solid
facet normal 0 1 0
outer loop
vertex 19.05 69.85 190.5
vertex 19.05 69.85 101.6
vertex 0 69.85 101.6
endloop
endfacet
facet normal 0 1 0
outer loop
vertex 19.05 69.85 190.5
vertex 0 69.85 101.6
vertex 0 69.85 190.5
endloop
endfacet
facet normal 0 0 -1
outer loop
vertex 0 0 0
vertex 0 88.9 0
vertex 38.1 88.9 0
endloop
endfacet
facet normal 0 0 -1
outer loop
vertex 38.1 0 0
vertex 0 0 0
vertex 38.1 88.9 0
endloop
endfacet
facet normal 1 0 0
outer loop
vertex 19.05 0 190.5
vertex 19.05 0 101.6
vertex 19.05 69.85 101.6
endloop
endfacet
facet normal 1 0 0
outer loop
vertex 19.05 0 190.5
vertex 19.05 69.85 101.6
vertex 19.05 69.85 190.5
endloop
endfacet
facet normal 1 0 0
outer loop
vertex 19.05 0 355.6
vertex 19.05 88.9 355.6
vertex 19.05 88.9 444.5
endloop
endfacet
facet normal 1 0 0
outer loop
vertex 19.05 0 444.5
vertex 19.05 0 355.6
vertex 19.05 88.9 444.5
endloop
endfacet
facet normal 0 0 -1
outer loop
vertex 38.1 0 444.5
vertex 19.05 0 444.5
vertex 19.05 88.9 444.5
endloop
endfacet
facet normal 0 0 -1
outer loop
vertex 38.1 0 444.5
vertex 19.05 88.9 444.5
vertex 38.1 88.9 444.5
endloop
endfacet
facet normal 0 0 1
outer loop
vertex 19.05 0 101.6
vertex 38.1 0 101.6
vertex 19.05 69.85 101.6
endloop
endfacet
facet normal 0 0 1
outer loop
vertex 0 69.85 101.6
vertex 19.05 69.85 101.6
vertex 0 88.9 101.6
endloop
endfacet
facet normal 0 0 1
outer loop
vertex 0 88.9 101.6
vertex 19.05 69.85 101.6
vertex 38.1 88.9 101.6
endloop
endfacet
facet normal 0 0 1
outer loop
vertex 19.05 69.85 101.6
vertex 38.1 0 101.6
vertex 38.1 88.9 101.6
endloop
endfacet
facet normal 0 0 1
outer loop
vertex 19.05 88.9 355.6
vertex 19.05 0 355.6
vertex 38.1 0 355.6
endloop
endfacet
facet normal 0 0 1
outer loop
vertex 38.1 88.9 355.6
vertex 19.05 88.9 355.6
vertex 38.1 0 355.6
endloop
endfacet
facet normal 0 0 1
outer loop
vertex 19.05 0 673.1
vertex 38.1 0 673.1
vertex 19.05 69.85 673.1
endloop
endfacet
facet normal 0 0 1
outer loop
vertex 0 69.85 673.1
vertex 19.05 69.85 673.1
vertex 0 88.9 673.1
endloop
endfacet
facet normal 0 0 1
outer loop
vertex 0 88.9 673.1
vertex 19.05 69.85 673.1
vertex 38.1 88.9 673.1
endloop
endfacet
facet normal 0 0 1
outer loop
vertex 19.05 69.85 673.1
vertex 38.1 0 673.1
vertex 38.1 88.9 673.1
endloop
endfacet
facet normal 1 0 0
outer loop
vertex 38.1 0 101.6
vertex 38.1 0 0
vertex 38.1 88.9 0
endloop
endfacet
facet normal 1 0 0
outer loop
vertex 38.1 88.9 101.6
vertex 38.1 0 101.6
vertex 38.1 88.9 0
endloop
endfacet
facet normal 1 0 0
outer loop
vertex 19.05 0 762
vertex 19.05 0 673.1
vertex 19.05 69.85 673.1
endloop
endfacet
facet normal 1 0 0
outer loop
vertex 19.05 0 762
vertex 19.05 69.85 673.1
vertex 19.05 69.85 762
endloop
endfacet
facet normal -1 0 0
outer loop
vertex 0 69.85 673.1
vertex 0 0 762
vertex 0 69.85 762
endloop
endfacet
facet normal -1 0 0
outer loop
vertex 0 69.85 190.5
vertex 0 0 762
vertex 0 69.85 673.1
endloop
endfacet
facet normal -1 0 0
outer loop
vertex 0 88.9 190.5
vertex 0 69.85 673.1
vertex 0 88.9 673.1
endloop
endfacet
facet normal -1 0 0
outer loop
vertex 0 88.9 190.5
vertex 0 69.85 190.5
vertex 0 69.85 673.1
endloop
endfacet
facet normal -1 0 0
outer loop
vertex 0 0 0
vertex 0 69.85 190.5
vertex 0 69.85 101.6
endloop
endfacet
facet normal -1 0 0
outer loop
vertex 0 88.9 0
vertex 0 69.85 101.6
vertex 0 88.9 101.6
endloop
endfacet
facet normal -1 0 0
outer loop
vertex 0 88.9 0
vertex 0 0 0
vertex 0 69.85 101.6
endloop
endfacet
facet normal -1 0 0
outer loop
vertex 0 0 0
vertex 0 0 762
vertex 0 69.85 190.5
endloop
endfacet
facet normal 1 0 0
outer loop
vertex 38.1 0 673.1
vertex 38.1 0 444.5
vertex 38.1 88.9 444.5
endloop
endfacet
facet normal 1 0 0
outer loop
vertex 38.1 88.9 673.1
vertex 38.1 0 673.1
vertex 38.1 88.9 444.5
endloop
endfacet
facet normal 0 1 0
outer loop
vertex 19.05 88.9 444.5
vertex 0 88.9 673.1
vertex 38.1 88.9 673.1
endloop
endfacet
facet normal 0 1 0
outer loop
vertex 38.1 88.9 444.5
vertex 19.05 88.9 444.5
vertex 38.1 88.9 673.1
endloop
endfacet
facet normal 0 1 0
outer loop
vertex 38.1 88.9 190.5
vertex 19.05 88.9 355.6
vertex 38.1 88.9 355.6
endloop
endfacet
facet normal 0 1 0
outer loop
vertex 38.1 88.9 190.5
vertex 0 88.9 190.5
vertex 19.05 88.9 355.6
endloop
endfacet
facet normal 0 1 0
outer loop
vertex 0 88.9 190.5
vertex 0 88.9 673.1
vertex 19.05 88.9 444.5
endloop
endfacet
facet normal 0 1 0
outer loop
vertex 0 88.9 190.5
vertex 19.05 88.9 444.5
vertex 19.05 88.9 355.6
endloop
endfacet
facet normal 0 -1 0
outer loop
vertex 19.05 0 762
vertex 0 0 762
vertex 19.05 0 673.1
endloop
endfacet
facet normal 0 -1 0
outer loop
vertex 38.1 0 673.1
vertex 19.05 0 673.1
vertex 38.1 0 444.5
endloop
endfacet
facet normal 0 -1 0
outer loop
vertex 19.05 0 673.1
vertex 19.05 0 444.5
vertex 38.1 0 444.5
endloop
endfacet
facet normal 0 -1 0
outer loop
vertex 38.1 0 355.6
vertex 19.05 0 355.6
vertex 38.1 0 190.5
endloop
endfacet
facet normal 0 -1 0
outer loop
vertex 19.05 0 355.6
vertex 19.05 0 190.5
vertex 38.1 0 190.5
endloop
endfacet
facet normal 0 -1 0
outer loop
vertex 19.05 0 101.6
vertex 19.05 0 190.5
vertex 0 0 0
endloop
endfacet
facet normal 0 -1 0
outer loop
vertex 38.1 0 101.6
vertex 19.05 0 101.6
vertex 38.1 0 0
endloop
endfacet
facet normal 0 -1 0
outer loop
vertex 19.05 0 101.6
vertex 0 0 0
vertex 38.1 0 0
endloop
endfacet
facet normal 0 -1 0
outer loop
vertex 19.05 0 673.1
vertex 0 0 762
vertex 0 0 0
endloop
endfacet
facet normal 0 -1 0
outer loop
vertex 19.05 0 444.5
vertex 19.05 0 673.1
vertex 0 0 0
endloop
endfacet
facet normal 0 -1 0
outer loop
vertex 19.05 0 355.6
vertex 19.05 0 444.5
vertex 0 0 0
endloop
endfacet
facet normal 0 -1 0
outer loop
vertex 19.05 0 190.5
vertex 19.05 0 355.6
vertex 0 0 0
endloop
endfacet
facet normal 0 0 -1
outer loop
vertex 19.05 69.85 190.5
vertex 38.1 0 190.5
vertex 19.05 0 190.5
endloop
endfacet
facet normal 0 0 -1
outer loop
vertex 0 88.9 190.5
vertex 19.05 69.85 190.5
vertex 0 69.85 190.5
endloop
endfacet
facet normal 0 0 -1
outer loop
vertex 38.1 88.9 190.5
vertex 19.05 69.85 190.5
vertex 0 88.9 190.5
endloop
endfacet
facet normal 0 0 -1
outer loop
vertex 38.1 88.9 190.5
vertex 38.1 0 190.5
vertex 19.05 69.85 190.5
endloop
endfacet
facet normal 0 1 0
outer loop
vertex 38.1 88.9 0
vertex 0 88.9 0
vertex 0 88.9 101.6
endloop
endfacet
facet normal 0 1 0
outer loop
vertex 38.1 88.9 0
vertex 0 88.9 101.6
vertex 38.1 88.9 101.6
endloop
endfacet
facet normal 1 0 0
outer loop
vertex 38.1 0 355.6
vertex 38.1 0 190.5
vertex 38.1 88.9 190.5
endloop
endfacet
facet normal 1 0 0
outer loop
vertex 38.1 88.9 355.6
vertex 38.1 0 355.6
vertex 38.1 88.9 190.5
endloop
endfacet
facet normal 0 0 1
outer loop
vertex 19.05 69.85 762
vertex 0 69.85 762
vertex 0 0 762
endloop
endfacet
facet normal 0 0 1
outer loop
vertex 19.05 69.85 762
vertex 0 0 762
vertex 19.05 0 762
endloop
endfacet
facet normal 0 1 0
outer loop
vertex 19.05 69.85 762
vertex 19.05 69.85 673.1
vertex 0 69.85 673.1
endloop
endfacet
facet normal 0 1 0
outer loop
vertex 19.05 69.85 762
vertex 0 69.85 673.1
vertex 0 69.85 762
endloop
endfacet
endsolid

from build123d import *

# Parameters (mm, degrees)
F0_W      = 38.1
F0_H      = 88.9
F1_DEPTH  = 762
F2_W      = 19.05
F2_H      = 88.9
F3_DEPTH  = 88.901
F4_W      = 19.05
F4_H      = 88.9
F5_DEPTH  = 88.901
F6_W      = 19.05
F6_H      = 88.9
F7_DEPTH  = 88.901
F8_W      = 19.05
F8_H      = 88.9
F9_DEPTH  = 19.051
F10_W     = 19.05
F10_H     = 88.9
F11_DEPTH = 19.051


with BuildPart() as f1:
    # F0 (on Top) → F1 (new body)
    with BuildSketch(Plane.XY):
        with Locations((19.05, 44.45)):
            Rectangle(F0_W, F0_H)
    extrude(amount=F1_DEPTH)

    # F2 (on face) → F3 (cut, through all)
    with BuildSketch(Plane.XZ):
        with Locations((28.575, 717.55)):
            Rectangle(F2_W, F2_H)
    extrude(amount=-F3_DEPTH, mode=Mode.SUBTRACT)

    # F4 (on face) → F5 (cut, through all)
    with BuildSketch(Plane.XZ):
        with Locations((28.575, 146.05)):
            Rectangle(F4_W, F4_H)
    extrude(amount=-F5_DEPTH, mode=Mode.SUBTRACT)

    # F6 (on face) → F7 (cut, through all)
    with BuildSketch(Plane.XZ):
        with Locations((28.575, 400.05)):
            Rectangle(F6_W, F6_H)
    extrude(amount=-F7_DEPTH, mode=Mode.SUBTRACT)

    # F8 (on face) → F9 (cut, through all)
    with BuildSketch(Plane.YZ.offset(19.05)):
        with Locations((79.375, 717.55)):
            Rectangle(F8_W, F8_H)
    extrude(amount=-F9_DEPTH, mode=Mode.SUBTRACT)

    # F10 (on face) → F11 (cut, through all)
    with BuildSketch(Plane.YZ.offset(19.05)):
        with Locations((79.375, 146.05)):
            Rectangle(F10_W, F10_H)
    extrude(amount=-F11_DEPTH, mode=Mode.SUBTRACT)


solid = f1.part
